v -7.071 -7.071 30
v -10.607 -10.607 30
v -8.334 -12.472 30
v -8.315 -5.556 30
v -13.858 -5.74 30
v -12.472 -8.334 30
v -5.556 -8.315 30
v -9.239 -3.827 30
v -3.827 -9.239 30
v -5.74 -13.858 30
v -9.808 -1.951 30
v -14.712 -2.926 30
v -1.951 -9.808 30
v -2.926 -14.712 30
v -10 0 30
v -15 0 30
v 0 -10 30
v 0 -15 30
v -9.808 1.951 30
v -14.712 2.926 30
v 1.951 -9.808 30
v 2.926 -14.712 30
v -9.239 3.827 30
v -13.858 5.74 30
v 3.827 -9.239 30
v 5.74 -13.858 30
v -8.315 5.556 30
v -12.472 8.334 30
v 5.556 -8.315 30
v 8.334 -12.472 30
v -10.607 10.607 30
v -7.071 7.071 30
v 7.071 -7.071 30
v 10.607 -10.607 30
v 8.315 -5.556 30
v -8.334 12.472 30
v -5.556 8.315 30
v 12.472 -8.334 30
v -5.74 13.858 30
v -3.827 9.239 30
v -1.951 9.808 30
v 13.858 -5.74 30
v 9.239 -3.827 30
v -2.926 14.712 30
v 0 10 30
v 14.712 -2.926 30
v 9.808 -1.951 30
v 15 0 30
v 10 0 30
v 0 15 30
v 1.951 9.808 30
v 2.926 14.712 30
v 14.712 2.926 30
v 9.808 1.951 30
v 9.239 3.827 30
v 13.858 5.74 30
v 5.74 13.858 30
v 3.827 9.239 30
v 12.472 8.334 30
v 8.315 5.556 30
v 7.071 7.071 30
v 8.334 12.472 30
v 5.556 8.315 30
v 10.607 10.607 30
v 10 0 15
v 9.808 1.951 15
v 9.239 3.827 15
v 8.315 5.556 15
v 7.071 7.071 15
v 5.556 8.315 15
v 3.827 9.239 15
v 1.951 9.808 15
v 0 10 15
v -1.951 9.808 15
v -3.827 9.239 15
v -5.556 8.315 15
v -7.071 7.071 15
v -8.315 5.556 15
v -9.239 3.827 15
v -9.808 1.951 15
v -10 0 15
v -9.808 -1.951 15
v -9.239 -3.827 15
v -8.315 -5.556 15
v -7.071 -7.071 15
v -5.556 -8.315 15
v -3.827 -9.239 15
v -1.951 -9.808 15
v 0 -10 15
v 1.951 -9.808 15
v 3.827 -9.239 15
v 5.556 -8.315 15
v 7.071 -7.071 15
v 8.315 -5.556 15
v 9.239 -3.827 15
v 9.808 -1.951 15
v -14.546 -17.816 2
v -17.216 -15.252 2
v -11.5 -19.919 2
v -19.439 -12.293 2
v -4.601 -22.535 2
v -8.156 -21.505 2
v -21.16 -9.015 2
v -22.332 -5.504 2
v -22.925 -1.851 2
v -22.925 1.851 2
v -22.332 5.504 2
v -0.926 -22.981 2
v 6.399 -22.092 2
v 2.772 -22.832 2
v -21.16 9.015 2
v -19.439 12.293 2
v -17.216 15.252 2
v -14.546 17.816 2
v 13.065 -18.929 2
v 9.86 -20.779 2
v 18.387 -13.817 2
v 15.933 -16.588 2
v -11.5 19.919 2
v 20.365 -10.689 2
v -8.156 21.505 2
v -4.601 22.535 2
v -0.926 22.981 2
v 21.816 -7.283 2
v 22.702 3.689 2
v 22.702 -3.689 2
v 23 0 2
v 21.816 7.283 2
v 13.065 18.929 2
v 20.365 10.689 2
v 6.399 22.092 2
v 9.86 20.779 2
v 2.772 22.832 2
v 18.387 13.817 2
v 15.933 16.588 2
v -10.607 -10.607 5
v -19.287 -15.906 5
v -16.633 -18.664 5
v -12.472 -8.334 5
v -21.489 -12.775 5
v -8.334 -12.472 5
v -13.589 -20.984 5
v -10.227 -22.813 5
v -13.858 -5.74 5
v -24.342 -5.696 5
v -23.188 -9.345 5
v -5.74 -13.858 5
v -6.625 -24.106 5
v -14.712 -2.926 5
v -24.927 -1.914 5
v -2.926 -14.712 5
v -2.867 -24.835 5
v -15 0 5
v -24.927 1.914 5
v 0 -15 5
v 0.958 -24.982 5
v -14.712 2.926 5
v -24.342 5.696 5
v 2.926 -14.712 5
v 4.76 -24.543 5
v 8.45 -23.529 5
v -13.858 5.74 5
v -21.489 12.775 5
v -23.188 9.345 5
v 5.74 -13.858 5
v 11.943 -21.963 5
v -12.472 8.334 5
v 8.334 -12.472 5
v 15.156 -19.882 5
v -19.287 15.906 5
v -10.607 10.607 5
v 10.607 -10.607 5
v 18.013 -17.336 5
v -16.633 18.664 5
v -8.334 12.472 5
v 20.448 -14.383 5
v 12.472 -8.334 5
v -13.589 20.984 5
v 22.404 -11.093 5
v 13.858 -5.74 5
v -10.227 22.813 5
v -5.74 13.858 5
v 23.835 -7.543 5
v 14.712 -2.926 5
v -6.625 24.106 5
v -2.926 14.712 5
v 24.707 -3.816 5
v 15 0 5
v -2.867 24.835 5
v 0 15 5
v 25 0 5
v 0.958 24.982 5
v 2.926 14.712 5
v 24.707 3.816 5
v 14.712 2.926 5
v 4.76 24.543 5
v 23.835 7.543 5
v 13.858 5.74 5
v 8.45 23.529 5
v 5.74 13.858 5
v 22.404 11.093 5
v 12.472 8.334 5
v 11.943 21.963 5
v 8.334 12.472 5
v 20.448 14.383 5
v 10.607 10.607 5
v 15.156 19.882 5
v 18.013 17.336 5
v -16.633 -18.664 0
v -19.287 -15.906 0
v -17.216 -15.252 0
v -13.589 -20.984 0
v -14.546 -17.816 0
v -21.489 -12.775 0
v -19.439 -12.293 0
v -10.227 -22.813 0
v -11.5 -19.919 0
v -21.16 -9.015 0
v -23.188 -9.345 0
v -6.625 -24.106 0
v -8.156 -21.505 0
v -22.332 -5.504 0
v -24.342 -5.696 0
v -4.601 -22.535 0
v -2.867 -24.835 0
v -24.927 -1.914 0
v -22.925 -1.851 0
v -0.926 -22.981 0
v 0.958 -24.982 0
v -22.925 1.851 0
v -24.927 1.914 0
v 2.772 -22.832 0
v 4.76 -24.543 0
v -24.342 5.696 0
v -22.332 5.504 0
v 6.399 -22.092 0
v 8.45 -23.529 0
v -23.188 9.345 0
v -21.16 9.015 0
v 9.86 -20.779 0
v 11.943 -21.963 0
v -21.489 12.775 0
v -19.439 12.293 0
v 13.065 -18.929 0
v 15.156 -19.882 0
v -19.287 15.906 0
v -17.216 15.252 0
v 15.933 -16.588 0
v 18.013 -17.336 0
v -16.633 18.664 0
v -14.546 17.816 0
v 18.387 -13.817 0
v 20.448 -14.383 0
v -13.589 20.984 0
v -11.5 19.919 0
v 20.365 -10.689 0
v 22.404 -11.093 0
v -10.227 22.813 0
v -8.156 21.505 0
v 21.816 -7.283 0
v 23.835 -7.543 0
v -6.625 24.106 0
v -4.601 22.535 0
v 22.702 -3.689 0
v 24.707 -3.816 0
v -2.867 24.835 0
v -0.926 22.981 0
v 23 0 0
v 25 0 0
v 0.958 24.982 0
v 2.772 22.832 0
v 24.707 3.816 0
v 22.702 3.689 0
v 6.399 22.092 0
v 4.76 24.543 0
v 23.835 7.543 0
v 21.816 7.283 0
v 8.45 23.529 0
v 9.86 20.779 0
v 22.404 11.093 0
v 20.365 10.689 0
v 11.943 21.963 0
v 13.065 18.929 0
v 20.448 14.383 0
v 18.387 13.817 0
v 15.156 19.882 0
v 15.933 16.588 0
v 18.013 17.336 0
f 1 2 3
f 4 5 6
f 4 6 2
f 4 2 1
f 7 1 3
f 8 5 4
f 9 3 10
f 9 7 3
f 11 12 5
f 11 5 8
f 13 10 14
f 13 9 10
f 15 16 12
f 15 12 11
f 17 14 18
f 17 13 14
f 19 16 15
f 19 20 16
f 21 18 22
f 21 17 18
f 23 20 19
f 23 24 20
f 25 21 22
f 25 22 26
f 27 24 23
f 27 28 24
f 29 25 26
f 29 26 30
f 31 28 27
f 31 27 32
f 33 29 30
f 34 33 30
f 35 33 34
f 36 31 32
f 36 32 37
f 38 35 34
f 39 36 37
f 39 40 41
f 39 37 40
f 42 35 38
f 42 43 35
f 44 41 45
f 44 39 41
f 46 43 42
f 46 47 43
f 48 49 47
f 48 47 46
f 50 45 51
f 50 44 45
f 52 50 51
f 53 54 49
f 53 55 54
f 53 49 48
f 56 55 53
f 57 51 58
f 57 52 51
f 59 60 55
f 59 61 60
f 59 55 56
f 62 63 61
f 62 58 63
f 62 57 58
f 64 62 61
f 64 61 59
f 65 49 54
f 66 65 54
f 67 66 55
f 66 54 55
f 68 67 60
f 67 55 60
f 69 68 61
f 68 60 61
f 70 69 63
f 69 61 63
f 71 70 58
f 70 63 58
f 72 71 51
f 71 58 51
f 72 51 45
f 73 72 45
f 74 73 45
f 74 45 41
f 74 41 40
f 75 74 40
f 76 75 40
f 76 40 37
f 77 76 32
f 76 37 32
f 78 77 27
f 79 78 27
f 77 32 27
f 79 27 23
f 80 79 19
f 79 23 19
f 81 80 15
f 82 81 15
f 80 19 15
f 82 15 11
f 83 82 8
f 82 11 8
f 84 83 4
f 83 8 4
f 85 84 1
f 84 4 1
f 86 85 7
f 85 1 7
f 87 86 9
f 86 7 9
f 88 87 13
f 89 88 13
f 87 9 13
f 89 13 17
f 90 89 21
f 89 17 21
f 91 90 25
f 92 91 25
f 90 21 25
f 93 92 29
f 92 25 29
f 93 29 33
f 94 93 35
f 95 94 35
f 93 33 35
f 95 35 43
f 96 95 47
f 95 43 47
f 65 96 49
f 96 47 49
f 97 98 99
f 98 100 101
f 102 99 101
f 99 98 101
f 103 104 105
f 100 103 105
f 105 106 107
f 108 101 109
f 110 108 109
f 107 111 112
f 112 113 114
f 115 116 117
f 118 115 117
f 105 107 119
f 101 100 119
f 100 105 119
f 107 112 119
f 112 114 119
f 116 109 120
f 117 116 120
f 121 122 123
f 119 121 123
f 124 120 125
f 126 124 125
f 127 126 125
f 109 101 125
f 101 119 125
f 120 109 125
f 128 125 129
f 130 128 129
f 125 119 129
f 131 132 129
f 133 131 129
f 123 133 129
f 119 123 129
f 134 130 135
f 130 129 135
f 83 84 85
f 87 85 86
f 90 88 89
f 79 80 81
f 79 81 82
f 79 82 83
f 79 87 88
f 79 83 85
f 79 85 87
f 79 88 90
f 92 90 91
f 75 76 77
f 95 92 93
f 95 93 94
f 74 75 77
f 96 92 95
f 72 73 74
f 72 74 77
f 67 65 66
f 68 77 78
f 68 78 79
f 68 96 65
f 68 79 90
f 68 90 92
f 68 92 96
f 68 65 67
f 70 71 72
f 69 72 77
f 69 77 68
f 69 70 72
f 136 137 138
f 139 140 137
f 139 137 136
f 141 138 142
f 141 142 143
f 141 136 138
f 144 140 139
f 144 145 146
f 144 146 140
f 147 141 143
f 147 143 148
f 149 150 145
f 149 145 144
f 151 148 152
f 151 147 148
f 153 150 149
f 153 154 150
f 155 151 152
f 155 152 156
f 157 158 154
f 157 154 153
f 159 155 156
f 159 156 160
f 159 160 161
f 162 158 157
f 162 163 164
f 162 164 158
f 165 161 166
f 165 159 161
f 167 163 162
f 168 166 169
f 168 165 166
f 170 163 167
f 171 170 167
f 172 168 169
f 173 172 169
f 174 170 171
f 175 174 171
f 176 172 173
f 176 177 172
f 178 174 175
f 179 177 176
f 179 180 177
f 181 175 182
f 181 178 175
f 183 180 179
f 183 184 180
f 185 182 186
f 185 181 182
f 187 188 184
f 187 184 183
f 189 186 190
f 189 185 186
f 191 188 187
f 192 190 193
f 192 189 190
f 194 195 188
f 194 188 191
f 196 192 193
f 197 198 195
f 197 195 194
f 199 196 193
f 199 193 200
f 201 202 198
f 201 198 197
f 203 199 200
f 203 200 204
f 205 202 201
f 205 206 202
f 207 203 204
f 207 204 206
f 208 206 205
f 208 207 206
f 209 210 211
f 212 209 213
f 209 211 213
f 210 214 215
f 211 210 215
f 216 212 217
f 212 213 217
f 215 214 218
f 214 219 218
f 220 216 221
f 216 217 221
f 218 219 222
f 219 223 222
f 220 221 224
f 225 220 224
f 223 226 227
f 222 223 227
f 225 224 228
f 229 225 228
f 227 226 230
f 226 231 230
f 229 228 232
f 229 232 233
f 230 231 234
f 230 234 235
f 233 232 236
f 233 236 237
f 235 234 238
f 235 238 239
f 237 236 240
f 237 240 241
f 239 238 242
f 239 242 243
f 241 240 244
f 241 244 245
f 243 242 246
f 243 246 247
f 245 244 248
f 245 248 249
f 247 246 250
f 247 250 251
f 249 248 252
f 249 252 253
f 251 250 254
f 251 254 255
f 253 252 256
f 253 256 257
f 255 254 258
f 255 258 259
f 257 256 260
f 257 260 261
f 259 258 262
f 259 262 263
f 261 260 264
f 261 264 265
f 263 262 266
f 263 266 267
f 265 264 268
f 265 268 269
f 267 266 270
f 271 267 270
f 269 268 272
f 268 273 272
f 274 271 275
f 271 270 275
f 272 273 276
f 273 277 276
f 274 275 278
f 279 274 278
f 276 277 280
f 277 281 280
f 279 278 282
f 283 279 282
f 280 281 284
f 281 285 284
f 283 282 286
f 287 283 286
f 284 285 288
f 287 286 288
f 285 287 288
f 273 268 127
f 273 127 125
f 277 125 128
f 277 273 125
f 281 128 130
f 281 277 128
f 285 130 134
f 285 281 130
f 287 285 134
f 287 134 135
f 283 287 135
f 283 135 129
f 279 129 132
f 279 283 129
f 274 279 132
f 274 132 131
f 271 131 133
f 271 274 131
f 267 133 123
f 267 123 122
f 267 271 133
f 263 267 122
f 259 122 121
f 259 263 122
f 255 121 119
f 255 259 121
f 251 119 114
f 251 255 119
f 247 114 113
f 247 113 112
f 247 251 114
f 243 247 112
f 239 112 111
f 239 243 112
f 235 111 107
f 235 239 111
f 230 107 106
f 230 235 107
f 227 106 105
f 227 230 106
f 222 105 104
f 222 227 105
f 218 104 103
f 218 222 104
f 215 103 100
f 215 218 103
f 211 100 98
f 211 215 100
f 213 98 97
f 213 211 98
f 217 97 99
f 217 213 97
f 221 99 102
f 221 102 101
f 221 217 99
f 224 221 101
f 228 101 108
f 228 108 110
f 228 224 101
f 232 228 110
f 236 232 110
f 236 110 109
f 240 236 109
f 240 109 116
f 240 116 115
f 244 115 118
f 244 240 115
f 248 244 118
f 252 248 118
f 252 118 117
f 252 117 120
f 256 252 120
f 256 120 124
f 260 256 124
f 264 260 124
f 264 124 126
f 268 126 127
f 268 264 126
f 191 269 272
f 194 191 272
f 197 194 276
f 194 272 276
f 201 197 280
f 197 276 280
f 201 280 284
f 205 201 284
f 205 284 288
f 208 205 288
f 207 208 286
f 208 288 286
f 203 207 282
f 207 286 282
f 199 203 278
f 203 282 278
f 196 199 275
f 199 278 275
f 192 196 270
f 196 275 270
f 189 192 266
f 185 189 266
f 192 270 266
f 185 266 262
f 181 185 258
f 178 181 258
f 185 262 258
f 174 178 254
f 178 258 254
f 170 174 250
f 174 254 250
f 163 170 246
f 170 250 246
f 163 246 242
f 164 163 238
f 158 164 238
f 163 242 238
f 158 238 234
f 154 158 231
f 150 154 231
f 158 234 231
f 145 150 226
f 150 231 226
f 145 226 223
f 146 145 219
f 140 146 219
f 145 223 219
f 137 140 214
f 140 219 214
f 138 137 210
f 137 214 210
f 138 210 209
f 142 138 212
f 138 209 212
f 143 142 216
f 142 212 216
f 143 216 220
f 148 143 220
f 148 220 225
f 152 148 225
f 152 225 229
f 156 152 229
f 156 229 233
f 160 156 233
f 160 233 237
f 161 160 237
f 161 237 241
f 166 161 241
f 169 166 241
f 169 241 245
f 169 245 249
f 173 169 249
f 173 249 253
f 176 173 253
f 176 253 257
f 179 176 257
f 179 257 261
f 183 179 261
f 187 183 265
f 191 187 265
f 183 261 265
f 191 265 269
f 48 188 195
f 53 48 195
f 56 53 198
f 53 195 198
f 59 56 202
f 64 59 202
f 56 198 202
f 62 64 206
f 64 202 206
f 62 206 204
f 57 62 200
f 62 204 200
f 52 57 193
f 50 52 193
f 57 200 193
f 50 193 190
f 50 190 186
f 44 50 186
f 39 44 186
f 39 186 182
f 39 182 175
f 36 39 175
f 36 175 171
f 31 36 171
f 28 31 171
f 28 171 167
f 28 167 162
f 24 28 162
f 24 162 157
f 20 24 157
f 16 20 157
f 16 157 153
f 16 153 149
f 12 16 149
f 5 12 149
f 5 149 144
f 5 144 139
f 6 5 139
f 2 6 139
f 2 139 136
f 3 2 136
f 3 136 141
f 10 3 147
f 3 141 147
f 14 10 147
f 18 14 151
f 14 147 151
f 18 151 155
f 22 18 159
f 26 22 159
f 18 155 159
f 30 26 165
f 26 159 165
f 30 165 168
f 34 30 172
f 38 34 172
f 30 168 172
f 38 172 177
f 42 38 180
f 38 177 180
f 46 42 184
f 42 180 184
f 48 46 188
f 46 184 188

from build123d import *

# Parameters (mm, degrees)
F0_R     = 25
F0_R_2   = 15
F1_DEPTH = 5
F2_DEPTH = 30
F3_R     = 10
F4_DEPTH = 15
F5_R     = 23
F6_DEPTH = 2


with BuildPart() as f1:
    # F0 (on Top) → F1 (new body)
    with BuildSketch(Plane.XY):
        Circle(F0_R)
        Circle(F0_R_2, mode=Mode.SUBTRACT)
    extrude(amount=F1_DEPTH)

    # F0 (on Top) → F2 (join)
    with BuildSketch(Plane.XY):
        Circle(F0_R_2)
    extrude(amount=F2_DEPTH)

    # F3 (on face) → F4 (cut)
    with BuildSketch(Plane.XY.offset(30)):
        Circle(F3_R)
    extrude(amount=-F4_DEPTH, mode=Mode.SUBTRACT)

    # F5 (on face) → F6 (cut)
    with BuildSketch(Plane.XY):
        Circle(F5_R)
    extrude(amount=F6_DEPTH, mode=Mode.SUBTRACT)


solid = f1.part
